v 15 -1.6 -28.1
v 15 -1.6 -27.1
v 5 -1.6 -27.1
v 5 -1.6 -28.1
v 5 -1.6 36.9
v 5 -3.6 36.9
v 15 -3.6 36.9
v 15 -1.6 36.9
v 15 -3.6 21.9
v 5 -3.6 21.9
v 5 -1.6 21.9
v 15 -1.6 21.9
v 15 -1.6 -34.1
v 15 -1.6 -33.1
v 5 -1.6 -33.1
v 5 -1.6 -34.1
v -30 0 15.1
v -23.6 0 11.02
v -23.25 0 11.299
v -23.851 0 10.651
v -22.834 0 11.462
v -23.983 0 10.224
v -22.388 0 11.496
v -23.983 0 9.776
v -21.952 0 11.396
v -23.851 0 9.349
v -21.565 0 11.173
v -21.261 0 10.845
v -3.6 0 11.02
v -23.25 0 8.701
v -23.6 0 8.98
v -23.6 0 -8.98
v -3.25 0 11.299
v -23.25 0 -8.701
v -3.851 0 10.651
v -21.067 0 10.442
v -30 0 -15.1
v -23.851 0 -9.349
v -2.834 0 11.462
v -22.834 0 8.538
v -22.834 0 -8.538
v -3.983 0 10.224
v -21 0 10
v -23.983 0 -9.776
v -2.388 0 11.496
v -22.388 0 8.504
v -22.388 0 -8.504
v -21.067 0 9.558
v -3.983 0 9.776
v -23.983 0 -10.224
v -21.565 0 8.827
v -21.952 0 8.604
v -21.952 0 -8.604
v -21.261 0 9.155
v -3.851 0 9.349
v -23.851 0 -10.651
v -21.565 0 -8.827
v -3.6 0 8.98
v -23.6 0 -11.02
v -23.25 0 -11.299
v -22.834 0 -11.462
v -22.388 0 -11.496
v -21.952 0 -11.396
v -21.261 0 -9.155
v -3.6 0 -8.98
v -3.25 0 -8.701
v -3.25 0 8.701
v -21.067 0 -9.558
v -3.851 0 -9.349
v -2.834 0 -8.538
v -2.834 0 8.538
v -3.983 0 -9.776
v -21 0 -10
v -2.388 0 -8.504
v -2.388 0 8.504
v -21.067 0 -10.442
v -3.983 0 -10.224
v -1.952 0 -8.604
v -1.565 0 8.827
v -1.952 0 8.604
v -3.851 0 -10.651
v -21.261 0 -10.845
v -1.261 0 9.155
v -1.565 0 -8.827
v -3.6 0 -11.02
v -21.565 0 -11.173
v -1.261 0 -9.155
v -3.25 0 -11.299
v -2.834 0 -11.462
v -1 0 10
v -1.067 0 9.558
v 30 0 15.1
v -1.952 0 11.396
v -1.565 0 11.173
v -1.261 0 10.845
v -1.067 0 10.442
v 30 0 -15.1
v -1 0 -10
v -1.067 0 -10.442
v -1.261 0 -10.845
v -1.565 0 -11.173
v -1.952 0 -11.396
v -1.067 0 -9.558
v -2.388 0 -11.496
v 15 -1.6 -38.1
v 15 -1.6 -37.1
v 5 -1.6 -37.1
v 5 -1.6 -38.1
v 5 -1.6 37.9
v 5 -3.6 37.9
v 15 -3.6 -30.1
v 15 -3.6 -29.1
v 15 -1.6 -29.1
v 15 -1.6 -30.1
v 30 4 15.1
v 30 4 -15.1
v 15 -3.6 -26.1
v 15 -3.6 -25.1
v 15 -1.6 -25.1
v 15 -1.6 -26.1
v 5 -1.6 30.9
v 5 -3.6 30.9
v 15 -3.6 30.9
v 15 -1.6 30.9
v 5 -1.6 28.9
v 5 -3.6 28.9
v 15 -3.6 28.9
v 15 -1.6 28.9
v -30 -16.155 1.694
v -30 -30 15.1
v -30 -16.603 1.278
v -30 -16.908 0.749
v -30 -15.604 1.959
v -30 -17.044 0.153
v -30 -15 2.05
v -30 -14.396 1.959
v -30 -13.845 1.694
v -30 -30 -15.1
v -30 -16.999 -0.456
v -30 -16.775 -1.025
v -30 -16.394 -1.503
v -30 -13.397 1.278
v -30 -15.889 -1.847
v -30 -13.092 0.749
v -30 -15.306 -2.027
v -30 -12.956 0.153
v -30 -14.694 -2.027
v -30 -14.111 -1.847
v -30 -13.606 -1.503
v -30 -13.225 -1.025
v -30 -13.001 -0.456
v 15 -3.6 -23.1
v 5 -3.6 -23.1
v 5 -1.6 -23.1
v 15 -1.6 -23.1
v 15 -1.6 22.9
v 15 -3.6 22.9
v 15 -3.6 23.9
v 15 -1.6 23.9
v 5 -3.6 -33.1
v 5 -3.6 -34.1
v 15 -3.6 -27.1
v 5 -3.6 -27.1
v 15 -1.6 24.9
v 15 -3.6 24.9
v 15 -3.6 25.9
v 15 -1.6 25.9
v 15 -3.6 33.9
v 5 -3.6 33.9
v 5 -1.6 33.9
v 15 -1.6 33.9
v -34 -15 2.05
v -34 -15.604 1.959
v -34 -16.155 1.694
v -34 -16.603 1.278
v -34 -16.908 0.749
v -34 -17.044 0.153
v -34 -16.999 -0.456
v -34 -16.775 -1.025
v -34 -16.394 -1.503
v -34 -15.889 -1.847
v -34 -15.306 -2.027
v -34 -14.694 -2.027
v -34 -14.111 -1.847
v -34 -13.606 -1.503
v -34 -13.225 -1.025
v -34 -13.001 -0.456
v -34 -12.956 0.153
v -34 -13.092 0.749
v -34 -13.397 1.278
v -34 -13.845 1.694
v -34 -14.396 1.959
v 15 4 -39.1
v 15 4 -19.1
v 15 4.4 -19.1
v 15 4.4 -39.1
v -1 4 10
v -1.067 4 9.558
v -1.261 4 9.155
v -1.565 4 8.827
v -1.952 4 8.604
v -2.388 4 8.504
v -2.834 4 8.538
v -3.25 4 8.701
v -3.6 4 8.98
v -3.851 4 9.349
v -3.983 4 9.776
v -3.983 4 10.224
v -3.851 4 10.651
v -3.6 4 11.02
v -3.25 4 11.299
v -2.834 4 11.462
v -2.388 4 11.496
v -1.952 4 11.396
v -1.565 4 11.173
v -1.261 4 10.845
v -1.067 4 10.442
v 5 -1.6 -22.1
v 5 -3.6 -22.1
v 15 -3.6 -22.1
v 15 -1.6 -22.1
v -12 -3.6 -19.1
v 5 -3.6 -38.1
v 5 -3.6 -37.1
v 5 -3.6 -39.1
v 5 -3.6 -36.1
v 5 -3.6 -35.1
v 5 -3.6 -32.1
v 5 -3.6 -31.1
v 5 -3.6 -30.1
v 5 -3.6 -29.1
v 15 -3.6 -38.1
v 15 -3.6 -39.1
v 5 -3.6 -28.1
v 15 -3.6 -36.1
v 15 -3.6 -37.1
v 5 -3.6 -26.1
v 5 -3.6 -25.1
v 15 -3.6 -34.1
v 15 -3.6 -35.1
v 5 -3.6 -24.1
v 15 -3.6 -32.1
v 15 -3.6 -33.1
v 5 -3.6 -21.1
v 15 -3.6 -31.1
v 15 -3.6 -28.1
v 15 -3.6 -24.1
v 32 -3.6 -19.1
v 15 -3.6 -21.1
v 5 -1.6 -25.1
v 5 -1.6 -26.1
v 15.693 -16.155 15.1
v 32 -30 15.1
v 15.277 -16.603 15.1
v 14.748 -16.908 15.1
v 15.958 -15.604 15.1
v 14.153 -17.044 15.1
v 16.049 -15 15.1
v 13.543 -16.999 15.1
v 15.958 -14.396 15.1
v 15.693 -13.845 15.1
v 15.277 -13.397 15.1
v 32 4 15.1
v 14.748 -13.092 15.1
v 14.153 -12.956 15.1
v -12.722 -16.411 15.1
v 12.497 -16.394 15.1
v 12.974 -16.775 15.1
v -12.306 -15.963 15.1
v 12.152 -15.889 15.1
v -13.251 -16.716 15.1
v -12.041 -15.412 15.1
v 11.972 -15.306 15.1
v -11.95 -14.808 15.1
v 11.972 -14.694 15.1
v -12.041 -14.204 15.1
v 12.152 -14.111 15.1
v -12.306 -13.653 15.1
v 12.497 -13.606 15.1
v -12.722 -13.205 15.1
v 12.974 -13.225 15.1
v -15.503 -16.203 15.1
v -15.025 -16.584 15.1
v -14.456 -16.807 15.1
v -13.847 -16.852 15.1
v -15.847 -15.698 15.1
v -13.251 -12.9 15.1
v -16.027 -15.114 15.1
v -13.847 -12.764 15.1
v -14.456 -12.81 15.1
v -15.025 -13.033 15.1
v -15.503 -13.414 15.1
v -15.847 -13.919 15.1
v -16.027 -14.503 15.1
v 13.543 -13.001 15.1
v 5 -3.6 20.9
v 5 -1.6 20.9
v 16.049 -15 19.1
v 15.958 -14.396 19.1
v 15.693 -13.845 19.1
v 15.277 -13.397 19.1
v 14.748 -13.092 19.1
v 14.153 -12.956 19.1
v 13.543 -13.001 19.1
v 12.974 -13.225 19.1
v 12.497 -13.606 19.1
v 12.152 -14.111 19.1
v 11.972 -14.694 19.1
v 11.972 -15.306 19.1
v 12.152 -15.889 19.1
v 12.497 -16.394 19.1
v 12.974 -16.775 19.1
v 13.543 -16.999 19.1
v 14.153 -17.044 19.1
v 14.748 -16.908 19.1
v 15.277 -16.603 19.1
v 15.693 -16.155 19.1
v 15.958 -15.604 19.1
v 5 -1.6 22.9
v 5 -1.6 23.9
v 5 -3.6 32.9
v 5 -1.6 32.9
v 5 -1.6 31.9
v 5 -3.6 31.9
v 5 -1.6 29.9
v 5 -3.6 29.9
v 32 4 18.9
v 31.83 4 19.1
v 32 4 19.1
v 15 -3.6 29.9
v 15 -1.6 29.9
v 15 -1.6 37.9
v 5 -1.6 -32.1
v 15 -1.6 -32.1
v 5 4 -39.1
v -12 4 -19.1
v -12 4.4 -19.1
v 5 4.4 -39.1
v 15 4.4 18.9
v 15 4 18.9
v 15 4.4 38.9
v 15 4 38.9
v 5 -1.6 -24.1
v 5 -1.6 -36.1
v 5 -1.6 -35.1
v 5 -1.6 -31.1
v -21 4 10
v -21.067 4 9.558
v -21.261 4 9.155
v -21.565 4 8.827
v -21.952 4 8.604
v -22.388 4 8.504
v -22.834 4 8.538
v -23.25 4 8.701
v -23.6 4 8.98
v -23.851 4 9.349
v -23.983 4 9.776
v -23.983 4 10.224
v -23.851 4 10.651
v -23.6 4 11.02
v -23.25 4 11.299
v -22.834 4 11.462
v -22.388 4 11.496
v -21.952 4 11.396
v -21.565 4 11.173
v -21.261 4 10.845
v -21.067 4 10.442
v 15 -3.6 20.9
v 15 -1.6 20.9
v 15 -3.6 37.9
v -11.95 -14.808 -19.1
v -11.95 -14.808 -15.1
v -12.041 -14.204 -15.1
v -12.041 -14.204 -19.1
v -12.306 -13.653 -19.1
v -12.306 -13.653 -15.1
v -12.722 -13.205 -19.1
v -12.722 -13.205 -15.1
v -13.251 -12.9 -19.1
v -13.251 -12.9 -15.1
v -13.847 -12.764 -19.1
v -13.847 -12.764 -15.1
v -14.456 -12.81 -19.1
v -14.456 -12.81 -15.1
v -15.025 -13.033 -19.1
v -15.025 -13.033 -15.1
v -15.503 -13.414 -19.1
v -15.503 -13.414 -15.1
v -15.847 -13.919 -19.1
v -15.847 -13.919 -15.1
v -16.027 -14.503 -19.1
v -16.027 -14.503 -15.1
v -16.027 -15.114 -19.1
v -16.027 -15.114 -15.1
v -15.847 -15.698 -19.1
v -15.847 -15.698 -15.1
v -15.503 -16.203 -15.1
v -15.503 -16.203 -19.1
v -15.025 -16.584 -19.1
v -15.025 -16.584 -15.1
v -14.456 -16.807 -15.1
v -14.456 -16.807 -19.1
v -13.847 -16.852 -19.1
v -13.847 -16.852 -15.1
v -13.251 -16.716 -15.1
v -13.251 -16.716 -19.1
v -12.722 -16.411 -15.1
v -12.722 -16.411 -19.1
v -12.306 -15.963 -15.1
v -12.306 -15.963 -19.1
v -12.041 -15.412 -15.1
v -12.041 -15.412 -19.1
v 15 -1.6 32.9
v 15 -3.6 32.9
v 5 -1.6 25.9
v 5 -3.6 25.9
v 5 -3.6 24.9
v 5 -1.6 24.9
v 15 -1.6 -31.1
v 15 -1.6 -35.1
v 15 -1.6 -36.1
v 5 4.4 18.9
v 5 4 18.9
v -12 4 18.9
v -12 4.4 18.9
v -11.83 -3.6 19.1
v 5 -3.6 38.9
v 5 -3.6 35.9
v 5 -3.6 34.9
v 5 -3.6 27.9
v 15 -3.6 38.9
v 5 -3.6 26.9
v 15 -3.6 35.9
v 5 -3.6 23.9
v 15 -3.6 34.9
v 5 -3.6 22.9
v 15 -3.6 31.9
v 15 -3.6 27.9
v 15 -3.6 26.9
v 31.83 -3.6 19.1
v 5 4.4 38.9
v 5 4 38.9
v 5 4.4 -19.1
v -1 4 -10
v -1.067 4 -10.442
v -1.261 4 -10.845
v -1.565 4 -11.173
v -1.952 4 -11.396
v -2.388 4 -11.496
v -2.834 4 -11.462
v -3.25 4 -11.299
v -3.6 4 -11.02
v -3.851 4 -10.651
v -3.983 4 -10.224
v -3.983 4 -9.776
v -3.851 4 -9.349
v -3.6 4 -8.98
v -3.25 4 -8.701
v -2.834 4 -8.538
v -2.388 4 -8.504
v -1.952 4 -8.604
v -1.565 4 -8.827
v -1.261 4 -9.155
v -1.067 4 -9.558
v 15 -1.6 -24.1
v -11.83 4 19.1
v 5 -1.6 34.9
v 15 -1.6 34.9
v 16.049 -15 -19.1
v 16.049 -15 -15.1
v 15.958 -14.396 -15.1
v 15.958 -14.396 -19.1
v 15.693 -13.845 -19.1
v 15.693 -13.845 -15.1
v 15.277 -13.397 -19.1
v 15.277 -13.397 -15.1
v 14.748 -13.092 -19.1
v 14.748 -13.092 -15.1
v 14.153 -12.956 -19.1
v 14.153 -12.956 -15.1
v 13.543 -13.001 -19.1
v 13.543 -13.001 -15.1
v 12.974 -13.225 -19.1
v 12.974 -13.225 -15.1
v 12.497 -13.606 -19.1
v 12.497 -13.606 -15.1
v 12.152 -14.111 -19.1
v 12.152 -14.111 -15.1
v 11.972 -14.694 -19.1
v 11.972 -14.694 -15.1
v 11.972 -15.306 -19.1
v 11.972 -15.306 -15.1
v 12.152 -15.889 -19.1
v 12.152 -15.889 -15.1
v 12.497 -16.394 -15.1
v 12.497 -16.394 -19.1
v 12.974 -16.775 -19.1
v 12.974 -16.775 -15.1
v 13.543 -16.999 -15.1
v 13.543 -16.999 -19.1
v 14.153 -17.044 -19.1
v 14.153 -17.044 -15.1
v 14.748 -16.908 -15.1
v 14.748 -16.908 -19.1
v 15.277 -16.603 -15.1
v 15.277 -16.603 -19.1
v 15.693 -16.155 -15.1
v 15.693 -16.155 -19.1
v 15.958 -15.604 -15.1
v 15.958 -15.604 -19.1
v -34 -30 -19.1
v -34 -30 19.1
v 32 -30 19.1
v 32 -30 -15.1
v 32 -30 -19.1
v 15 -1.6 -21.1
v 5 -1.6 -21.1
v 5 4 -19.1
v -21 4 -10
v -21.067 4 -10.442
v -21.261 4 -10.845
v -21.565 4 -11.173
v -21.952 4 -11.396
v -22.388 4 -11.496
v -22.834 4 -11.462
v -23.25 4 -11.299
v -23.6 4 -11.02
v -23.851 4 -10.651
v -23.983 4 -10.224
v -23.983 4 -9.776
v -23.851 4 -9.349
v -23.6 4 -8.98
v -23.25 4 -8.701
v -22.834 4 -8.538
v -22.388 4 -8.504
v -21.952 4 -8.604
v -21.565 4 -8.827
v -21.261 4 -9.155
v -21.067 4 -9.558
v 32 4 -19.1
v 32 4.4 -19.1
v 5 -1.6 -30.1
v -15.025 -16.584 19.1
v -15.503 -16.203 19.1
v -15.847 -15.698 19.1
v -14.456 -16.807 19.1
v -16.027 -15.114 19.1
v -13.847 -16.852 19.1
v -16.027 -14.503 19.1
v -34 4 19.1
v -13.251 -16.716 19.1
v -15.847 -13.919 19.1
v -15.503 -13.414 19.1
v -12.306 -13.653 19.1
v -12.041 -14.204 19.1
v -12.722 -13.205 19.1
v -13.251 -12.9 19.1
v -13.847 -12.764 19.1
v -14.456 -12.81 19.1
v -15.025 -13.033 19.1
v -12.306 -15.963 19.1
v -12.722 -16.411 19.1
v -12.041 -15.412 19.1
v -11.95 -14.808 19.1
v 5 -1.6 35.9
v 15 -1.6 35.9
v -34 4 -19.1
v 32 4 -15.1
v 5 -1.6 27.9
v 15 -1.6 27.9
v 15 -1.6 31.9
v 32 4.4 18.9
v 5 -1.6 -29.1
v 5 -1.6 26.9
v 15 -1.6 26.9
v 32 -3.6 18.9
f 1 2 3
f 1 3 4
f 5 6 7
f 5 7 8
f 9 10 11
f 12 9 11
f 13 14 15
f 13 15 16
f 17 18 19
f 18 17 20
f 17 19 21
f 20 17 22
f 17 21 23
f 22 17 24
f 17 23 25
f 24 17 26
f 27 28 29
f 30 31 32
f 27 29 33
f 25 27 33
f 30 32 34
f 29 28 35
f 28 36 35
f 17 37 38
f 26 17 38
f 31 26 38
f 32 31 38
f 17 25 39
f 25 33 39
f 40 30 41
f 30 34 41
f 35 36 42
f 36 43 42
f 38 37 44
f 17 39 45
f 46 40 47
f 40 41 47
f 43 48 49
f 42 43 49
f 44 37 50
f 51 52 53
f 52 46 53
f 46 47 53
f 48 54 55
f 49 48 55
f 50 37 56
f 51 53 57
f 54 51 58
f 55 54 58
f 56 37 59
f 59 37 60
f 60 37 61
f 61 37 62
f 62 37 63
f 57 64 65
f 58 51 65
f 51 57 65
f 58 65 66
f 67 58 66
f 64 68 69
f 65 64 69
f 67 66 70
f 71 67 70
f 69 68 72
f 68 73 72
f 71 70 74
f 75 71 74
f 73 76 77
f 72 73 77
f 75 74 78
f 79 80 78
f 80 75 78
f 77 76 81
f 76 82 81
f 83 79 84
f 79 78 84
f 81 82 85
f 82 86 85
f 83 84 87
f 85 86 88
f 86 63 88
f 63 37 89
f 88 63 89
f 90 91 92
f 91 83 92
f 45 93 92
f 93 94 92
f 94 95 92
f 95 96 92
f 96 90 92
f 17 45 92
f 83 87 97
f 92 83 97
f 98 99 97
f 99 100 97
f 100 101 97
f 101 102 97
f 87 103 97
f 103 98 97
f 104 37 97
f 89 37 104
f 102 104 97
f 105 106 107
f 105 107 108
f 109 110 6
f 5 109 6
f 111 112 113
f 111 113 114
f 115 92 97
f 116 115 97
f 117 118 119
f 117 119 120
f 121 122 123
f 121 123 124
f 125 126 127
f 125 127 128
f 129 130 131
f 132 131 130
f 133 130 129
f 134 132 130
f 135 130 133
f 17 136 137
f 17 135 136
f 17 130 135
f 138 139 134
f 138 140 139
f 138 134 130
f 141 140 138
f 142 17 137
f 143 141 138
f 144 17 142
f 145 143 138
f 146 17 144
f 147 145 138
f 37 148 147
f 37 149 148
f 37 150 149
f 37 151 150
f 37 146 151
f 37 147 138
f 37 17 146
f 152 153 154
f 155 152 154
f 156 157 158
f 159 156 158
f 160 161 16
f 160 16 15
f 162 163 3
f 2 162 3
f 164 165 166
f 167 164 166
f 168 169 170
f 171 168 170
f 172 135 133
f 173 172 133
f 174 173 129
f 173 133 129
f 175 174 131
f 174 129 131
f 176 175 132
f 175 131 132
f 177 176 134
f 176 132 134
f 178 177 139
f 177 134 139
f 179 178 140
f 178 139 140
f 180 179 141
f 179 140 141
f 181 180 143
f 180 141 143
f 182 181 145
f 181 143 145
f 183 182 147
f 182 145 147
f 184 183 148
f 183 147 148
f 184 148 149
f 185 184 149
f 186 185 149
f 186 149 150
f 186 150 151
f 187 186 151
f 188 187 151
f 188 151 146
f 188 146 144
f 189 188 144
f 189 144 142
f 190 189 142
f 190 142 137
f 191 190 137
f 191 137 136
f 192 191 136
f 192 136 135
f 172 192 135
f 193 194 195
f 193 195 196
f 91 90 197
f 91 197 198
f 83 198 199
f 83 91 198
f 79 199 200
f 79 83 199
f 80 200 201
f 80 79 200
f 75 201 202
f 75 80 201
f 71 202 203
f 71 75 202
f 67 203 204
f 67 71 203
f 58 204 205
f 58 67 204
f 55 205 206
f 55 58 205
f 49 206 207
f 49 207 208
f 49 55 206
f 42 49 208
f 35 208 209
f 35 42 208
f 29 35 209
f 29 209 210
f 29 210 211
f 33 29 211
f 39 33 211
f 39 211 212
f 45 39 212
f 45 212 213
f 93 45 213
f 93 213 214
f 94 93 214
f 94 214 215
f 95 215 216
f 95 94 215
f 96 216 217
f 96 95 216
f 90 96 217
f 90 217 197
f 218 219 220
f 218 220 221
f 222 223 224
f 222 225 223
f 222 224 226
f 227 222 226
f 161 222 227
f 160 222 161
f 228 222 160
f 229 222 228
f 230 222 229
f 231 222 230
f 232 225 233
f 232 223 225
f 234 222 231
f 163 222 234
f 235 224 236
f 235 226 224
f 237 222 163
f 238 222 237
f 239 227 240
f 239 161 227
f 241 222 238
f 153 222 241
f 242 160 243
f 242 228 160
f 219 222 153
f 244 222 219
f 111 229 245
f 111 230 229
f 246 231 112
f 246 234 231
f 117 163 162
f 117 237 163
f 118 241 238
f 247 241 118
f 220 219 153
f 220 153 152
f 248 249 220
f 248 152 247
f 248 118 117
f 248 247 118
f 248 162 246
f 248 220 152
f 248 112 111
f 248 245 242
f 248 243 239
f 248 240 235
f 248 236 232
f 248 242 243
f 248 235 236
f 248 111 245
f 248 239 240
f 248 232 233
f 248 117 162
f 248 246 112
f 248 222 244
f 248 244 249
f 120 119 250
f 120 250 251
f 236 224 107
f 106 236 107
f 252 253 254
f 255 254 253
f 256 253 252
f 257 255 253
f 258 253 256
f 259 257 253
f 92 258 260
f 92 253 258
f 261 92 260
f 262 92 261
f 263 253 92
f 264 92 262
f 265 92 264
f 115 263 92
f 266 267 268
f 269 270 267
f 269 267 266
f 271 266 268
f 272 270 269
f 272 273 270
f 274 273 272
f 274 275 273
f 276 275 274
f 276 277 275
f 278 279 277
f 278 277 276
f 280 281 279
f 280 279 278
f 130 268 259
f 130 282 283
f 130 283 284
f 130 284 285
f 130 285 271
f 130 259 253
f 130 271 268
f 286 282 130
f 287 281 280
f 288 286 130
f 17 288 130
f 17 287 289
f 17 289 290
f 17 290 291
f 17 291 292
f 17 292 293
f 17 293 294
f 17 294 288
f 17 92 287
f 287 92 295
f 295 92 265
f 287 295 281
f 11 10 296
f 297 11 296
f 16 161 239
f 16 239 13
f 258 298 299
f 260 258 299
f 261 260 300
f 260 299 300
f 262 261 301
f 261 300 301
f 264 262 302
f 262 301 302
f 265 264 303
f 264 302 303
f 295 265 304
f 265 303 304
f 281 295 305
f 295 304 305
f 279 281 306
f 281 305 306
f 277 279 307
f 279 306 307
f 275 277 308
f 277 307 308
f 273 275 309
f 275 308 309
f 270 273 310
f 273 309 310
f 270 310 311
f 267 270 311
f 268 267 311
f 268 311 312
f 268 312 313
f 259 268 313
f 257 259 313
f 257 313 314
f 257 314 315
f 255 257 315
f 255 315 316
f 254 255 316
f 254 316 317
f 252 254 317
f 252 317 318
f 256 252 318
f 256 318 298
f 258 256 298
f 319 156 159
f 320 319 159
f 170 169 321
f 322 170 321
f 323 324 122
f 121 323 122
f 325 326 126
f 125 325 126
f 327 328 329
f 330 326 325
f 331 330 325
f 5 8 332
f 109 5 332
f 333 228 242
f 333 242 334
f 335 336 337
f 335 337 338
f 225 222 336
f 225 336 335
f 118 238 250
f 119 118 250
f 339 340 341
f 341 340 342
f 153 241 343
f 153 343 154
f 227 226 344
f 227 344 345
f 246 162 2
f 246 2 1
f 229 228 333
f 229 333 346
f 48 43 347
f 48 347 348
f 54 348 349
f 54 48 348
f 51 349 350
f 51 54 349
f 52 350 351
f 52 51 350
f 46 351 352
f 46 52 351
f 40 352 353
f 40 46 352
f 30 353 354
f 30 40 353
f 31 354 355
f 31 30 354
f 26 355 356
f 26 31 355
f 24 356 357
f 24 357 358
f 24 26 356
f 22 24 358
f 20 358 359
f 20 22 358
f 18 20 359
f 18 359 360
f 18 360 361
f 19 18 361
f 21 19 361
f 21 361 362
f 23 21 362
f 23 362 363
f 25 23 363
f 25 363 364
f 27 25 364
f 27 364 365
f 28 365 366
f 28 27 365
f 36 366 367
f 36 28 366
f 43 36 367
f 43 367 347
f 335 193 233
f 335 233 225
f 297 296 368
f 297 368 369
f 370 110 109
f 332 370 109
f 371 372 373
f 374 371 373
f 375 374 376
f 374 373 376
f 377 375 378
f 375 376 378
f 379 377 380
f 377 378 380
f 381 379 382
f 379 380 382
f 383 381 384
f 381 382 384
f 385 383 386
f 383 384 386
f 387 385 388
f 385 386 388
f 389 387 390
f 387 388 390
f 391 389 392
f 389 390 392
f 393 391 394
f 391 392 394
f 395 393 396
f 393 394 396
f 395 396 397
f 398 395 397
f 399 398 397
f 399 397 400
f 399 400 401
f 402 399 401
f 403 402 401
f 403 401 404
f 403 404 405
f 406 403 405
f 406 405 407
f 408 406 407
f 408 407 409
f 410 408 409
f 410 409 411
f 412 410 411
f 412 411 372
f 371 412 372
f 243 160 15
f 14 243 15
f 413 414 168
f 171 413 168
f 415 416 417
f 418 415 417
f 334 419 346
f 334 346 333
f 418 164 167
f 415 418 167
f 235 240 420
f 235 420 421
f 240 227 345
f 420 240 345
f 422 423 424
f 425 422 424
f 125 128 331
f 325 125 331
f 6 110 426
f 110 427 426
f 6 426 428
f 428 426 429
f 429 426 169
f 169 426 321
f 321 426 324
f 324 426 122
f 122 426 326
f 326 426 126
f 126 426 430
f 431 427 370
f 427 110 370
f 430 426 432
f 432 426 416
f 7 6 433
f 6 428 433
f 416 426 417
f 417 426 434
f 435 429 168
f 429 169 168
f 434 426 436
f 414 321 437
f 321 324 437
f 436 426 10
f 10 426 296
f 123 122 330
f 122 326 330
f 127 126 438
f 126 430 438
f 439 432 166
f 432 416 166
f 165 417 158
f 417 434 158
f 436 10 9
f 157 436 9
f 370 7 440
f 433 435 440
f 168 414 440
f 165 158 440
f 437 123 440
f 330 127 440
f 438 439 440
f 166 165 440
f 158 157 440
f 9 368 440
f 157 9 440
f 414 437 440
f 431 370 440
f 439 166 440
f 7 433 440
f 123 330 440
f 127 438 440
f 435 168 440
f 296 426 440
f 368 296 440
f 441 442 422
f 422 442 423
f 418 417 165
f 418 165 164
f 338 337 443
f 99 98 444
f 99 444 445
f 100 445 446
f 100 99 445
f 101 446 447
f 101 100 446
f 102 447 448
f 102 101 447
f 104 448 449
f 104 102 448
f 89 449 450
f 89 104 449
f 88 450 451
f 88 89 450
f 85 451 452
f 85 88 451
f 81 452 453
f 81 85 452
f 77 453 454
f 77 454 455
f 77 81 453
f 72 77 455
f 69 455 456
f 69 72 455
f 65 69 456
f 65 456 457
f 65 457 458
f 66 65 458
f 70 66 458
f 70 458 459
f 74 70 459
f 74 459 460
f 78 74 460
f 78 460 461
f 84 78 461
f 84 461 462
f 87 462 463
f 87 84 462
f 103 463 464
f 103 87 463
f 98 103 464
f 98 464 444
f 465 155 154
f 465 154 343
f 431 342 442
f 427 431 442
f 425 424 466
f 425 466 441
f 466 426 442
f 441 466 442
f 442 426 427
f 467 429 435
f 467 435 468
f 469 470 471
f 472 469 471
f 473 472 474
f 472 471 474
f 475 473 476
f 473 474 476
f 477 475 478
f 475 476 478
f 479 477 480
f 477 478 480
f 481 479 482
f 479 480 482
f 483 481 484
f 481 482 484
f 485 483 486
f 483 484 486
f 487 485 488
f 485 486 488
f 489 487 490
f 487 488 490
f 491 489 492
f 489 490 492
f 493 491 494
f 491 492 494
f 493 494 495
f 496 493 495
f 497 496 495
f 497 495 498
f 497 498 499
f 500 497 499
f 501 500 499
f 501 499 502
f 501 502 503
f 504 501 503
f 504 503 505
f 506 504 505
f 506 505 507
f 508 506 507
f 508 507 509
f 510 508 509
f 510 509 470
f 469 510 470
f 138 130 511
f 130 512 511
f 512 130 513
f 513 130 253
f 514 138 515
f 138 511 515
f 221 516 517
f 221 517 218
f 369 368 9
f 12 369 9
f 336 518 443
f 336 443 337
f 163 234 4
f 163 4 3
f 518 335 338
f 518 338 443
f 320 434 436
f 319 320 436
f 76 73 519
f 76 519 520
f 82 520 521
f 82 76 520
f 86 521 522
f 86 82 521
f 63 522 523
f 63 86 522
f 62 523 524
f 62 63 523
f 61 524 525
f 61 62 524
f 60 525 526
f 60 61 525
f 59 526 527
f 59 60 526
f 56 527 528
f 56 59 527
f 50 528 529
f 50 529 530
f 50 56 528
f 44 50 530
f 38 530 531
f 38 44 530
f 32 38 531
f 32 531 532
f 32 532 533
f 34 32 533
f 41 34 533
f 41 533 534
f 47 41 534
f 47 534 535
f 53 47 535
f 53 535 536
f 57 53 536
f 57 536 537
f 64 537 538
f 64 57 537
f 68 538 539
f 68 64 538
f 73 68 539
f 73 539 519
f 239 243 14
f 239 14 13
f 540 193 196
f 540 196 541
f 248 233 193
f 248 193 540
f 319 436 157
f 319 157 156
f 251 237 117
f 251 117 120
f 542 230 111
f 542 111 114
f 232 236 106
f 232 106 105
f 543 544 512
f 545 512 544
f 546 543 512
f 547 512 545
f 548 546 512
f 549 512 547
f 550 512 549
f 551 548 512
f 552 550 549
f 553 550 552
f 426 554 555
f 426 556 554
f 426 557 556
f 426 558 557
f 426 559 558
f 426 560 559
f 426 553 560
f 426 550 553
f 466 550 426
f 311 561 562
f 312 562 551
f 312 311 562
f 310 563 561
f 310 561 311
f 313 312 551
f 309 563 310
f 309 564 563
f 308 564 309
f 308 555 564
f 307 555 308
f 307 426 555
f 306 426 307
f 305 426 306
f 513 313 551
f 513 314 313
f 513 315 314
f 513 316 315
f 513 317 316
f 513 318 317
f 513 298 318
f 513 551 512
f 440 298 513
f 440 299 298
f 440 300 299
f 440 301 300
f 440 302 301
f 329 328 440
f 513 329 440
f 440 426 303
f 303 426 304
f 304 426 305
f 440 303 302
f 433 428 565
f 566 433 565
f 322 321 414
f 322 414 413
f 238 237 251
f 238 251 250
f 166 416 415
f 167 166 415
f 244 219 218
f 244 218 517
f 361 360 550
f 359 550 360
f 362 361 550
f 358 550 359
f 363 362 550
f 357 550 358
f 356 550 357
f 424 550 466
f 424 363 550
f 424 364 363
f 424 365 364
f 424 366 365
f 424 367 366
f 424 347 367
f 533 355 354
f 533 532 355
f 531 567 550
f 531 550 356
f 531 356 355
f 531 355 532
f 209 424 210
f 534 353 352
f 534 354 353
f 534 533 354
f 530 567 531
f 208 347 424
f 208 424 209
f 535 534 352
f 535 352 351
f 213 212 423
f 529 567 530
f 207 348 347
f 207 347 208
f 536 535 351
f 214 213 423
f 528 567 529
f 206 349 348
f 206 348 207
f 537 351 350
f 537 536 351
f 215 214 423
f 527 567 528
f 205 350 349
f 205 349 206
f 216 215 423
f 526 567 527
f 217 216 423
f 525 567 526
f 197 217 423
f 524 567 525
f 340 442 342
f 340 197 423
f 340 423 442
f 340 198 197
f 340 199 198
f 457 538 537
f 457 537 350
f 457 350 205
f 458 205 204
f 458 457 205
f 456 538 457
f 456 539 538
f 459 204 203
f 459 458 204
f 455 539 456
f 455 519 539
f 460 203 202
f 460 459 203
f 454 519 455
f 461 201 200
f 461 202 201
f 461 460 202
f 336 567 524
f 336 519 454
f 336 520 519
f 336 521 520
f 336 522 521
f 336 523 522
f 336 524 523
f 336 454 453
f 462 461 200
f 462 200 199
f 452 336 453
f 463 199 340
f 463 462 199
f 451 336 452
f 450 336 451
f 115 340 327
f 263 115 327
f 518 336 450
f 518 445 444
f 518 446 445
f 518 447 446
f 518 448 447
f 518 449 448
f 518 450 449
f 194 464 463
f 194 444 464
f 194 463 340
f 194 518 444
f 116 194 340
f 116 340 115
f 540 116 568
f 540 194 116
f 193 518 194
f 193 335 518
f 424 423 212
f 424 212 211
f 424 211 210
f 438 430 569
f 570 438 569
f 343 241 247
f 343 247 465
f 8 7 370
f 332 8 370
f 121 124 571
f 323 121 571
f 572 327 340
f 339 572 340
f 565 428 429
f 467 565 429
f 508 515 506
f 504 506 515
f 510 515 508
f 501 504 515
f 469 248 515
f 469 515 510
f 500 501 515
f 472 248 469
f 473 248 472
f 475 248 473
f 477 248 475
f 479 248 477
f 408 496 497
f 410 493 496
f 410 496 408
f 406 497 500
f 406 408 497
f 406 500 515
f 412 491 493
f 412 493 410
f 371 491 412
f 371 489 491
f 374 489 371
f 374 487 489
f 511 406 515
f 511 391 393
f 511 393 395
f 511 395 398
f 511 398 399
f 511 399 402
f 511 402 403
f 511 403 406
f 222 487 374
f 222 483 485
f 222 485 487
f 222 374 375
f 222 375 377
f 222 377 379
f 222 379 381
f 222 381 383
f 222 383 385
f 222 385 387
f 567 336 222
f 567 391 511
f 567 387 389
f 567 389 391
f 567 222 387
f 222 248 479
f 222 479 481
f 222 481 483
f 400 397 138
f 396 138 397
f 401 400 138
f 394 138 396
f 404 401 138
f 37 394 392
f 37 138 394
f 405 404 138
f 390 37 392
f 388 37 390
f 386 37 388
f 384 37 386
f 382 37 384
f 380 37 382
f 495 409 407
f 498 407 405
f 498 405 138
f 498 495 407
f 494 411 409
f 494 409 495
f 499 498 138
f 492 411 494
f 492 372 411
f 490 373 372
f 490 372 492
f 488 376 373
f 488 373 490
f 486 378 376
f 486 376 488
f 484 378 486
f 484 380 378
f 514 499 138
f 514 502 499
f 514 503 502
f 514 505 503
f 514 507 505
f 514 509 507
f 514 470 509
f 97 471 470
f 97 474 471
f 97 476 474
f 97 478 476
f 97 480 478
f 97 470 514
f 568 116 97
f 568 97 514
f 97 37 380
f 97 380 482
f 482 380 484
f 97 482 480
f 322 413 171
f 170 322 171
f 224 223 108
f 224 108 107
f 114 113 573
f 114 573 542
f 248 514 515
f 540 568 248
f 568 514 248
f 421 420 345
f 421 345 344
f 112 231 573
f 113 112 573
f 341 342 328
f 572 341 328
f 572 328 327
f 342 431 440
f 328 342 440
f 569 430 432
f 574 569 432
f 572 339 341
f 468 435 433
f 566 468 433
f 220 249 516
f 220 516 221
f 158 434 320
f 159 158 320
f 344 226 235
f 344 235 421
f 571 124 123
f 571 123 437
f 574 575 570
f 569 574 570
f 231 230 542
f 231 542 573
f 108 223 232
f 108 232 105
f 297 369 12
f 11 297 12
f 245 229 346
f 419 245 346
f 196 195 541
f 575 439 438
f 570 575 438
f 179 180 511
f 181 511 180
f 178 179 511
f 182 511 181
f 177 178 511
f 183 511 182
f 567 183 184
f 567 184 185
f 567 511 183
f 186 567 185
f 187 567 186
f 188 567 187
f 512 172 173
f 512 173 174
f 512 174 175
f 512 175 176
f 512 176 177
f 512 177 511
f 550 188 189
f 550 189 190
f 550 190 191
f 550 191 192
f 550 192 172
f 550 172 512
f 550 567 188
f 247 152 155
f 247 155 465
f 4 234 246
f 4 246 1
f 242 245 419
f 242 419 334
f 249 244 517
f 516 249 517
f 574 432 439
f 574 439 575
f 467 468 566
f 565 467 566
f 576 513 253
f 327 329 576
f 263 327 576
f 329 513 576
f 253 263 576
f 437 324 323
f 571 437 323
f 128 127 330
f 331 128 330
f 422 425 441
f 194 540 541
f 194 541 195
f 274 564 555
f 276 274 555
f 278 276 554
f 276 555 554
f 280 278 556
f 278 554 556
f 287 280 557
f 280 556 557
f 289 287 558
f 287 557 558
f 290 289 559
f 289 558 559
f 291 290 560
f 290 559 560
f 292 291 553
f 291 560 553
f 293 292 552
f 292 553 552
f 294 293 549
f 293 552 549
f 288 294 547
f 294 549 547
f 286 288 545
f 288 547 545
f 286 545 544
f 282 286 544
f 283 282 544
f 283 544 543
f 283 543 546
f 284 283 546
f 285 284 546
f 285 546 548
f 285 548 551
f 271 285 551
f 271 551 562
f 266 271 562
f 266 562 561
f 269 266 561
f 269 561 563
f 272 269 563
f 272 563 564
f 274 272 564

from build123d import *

# Parameters (mm, degrees)
SKIZZE1_W                                  = 60
SKIZZE1_H                                  = 30.2
SKIZZE1_R                                  = 1.5
AUFSATZ_LINEAR_AUSTRAGEN1_DEPTH            = 4
LINEAR_AUSTRAGEN_D_NN1_DEPTH               = 34
F_4_1_4_1_DURCHMESSER_BOHRUNG1_D           = 4.1
F_4_1_4_1_DURCHMESSER_BOHRUNG1_ON_FACE_2_D = 4.1
SKIZZE4_W                                  = 10
SKIZZE4_H                                  = 7.6
AUFSATZ_LINEAR_AUSTRAGEN3_DEPTH            = 20
SKIZZE5_W                                  = 1
SKIZZE5_H                                  = 2
SCHNITT_LINEAR_AUSTRAGEN1_DEPTH            = 20
AUFSATZ_LINEAR_AUSTRAGEN4_DEPTH            = 8


with BuildPart() as part:
    # Skizze1 → Aufsatz-Linear austragen1 (new body)
    with BuildSketch(Plane(origin=(0, 0, 0), x_dir=(1, 0, 0), z_dir=(0, 1, 0))):
        Rectangle(SKIZZE1_W, SKIZZE1_H)
        with Locations((-22.5, 10)):
            Circle(SKIZZE1_R, mode=Mode.SUBTRACT)
        with Locations((-22.5, -10)):
            Circle(SKIZZE1_R, mode=Mode.SUBTRACT)
        with Locations((-2.5, 10)):
            Circle(SKIZZE1_R, mode=Mode.SUBTRACT)
        with Locations((-2.5, -10)):
            Circle(SKIZZE1_R, mode=Mode.SUBTRACT)
    extrude(amount=AUFSATZ_LINEAR_AUSTRAGEN1_DEPTH)

    # Skizze2 → Linear-Austragen-Dünn1 (add)
    with BuildSketch(Plane(origin=(0, 4, 0), x_dir=(1, 0, 0), z_dir=(0, 1, 0))):
        Polygon((32, -15.1), (-30, -15.1), (-30, 15.1), (32, 15.1), (32, 19.1), (-34, 19.1), (-34, -19.1), (32, -19.1), align=None)
    extrude(amount=-LINEAR_AUSTRAGEN_D_NN1_DEPTH)

    # Ø4.1 (4.1) Durchmesser Bohrung1 (through all)
    with Locations(Plane(origin=(-14, -14.808153884, -19.1), x_dir=(-1, 0, 0), z_dir=(0, 0, -1))):
        with Locations((0, 0), (-27.999342761, -0.191846116)):
            Hole(F_4_1_4_1_DURCHMESSER_BOHRUNG1_D / 2)

    # Ø4.1 (4.1) Durchmesser Bohrung1 on face 2 (through all)
    with Locations(Plane(origin=(-34, -15, 0), x_dir=(0, 0, -1), z_dir=(-1, 0, 0))):
        with Locations((0, 0)):
            Hole(F_4_1_4_1_DURCHMESSER_BOHRUNG1_ON_FACE_2_D / 2)

    # Skizze4 → Aufsatz-Linear austragen3 (add)
    with BuildSketch(Plane(origin=(0, 0, -19.1), x_dir=(-1, 0, 0), z_dir=(0, 0, -1))):
        with Locations((-10, 0.2)):
            Rectangle(SKIZZE4_W, SKIZZE4_H)
    aufsatz_linear_austragen3 = extrude(amount=AUFSATZ_LINEAR_AUSTRAGEN3_DEPTH)

    # Skizze5 → Schnitt-Linear austragen1 (cut)
    with BuildSketch(Plane(origin=(15, 0, 0), x_dir=(0, 0, -1), z_dir=(1, 0, 0))):
        with Locations((37.6, -2.6)):
            Rectangle(SKIZZE5_W, SKIZZE5_H)
        with Locations((35.6, -2.6)):
            Rectangle(SKIZZE5_W, SKIZZE5_H)
        with Locations((33.6, -2.6)):
            Rectangle(SKIZZE5_W, SKIZZE5_H)
        with Locations((31.6, -2.6)):
            Rectangle(SKIZZE5_W, SKIZZE5_H)
        with Locations((29.6, -2.6)):
            Rectangle(SKIZZE5_W, SKIZZE5_H)
        with Locations((27.6, -2.6)):
            Rectangle(SKIZZE5_W, SKIZZE5_H)
        with Locations((25.6, -2.6)):
            Rectangle(SKIZZE5_W, SKIZZE5_H)
        with Locations((23.6, -2.6)):
            Rectangle(SKIZZE5_W, SKIZZE5_H)
        with Locations((21.6, -2.6)):
            Rectangle(SKIZZE5_W, SKIZZE5_H)
    schnitt_linear_austragen1 = extrude(amount=-SCHNITT_LINEAR_AUSTRAGEN1_DEPTH, mode=Mode.SUBTRACT)

    # Skizze6 → Aufsatz-Linear austragen4 (add)
    with BuildSketch(Plane.XZ.offset(3.6)):
        Polygon((15, -39.1), (32, -19.1), (15, -19.1), align=None)
        Polygon((5, -39.1), (5, -19.1), (-12, -19.1), align=None)
    aufsatz_linear_austragen4 = extrude(amount=-AUFSATZ_LINEAR_AUSTRAGEN4_DEPTH)

    # Spiegeln1: Aufsatz-Linear austragen3, Schnitt-Linear austragen1, Aufsatz-Linear austragen4 across plane
    add(aufsatz_linear_austragen3.mirror(Plane.XY.offset(-0.1)))
    add(schnitt_linear_austragen1.mirror(Plane.XY.offset(-0.1)), mode=Mode.SUBTRACT)
    add(aufsatz_linear_austragen4.mirror(Plane.XY.offset(-0.1)))


solid = part.part
